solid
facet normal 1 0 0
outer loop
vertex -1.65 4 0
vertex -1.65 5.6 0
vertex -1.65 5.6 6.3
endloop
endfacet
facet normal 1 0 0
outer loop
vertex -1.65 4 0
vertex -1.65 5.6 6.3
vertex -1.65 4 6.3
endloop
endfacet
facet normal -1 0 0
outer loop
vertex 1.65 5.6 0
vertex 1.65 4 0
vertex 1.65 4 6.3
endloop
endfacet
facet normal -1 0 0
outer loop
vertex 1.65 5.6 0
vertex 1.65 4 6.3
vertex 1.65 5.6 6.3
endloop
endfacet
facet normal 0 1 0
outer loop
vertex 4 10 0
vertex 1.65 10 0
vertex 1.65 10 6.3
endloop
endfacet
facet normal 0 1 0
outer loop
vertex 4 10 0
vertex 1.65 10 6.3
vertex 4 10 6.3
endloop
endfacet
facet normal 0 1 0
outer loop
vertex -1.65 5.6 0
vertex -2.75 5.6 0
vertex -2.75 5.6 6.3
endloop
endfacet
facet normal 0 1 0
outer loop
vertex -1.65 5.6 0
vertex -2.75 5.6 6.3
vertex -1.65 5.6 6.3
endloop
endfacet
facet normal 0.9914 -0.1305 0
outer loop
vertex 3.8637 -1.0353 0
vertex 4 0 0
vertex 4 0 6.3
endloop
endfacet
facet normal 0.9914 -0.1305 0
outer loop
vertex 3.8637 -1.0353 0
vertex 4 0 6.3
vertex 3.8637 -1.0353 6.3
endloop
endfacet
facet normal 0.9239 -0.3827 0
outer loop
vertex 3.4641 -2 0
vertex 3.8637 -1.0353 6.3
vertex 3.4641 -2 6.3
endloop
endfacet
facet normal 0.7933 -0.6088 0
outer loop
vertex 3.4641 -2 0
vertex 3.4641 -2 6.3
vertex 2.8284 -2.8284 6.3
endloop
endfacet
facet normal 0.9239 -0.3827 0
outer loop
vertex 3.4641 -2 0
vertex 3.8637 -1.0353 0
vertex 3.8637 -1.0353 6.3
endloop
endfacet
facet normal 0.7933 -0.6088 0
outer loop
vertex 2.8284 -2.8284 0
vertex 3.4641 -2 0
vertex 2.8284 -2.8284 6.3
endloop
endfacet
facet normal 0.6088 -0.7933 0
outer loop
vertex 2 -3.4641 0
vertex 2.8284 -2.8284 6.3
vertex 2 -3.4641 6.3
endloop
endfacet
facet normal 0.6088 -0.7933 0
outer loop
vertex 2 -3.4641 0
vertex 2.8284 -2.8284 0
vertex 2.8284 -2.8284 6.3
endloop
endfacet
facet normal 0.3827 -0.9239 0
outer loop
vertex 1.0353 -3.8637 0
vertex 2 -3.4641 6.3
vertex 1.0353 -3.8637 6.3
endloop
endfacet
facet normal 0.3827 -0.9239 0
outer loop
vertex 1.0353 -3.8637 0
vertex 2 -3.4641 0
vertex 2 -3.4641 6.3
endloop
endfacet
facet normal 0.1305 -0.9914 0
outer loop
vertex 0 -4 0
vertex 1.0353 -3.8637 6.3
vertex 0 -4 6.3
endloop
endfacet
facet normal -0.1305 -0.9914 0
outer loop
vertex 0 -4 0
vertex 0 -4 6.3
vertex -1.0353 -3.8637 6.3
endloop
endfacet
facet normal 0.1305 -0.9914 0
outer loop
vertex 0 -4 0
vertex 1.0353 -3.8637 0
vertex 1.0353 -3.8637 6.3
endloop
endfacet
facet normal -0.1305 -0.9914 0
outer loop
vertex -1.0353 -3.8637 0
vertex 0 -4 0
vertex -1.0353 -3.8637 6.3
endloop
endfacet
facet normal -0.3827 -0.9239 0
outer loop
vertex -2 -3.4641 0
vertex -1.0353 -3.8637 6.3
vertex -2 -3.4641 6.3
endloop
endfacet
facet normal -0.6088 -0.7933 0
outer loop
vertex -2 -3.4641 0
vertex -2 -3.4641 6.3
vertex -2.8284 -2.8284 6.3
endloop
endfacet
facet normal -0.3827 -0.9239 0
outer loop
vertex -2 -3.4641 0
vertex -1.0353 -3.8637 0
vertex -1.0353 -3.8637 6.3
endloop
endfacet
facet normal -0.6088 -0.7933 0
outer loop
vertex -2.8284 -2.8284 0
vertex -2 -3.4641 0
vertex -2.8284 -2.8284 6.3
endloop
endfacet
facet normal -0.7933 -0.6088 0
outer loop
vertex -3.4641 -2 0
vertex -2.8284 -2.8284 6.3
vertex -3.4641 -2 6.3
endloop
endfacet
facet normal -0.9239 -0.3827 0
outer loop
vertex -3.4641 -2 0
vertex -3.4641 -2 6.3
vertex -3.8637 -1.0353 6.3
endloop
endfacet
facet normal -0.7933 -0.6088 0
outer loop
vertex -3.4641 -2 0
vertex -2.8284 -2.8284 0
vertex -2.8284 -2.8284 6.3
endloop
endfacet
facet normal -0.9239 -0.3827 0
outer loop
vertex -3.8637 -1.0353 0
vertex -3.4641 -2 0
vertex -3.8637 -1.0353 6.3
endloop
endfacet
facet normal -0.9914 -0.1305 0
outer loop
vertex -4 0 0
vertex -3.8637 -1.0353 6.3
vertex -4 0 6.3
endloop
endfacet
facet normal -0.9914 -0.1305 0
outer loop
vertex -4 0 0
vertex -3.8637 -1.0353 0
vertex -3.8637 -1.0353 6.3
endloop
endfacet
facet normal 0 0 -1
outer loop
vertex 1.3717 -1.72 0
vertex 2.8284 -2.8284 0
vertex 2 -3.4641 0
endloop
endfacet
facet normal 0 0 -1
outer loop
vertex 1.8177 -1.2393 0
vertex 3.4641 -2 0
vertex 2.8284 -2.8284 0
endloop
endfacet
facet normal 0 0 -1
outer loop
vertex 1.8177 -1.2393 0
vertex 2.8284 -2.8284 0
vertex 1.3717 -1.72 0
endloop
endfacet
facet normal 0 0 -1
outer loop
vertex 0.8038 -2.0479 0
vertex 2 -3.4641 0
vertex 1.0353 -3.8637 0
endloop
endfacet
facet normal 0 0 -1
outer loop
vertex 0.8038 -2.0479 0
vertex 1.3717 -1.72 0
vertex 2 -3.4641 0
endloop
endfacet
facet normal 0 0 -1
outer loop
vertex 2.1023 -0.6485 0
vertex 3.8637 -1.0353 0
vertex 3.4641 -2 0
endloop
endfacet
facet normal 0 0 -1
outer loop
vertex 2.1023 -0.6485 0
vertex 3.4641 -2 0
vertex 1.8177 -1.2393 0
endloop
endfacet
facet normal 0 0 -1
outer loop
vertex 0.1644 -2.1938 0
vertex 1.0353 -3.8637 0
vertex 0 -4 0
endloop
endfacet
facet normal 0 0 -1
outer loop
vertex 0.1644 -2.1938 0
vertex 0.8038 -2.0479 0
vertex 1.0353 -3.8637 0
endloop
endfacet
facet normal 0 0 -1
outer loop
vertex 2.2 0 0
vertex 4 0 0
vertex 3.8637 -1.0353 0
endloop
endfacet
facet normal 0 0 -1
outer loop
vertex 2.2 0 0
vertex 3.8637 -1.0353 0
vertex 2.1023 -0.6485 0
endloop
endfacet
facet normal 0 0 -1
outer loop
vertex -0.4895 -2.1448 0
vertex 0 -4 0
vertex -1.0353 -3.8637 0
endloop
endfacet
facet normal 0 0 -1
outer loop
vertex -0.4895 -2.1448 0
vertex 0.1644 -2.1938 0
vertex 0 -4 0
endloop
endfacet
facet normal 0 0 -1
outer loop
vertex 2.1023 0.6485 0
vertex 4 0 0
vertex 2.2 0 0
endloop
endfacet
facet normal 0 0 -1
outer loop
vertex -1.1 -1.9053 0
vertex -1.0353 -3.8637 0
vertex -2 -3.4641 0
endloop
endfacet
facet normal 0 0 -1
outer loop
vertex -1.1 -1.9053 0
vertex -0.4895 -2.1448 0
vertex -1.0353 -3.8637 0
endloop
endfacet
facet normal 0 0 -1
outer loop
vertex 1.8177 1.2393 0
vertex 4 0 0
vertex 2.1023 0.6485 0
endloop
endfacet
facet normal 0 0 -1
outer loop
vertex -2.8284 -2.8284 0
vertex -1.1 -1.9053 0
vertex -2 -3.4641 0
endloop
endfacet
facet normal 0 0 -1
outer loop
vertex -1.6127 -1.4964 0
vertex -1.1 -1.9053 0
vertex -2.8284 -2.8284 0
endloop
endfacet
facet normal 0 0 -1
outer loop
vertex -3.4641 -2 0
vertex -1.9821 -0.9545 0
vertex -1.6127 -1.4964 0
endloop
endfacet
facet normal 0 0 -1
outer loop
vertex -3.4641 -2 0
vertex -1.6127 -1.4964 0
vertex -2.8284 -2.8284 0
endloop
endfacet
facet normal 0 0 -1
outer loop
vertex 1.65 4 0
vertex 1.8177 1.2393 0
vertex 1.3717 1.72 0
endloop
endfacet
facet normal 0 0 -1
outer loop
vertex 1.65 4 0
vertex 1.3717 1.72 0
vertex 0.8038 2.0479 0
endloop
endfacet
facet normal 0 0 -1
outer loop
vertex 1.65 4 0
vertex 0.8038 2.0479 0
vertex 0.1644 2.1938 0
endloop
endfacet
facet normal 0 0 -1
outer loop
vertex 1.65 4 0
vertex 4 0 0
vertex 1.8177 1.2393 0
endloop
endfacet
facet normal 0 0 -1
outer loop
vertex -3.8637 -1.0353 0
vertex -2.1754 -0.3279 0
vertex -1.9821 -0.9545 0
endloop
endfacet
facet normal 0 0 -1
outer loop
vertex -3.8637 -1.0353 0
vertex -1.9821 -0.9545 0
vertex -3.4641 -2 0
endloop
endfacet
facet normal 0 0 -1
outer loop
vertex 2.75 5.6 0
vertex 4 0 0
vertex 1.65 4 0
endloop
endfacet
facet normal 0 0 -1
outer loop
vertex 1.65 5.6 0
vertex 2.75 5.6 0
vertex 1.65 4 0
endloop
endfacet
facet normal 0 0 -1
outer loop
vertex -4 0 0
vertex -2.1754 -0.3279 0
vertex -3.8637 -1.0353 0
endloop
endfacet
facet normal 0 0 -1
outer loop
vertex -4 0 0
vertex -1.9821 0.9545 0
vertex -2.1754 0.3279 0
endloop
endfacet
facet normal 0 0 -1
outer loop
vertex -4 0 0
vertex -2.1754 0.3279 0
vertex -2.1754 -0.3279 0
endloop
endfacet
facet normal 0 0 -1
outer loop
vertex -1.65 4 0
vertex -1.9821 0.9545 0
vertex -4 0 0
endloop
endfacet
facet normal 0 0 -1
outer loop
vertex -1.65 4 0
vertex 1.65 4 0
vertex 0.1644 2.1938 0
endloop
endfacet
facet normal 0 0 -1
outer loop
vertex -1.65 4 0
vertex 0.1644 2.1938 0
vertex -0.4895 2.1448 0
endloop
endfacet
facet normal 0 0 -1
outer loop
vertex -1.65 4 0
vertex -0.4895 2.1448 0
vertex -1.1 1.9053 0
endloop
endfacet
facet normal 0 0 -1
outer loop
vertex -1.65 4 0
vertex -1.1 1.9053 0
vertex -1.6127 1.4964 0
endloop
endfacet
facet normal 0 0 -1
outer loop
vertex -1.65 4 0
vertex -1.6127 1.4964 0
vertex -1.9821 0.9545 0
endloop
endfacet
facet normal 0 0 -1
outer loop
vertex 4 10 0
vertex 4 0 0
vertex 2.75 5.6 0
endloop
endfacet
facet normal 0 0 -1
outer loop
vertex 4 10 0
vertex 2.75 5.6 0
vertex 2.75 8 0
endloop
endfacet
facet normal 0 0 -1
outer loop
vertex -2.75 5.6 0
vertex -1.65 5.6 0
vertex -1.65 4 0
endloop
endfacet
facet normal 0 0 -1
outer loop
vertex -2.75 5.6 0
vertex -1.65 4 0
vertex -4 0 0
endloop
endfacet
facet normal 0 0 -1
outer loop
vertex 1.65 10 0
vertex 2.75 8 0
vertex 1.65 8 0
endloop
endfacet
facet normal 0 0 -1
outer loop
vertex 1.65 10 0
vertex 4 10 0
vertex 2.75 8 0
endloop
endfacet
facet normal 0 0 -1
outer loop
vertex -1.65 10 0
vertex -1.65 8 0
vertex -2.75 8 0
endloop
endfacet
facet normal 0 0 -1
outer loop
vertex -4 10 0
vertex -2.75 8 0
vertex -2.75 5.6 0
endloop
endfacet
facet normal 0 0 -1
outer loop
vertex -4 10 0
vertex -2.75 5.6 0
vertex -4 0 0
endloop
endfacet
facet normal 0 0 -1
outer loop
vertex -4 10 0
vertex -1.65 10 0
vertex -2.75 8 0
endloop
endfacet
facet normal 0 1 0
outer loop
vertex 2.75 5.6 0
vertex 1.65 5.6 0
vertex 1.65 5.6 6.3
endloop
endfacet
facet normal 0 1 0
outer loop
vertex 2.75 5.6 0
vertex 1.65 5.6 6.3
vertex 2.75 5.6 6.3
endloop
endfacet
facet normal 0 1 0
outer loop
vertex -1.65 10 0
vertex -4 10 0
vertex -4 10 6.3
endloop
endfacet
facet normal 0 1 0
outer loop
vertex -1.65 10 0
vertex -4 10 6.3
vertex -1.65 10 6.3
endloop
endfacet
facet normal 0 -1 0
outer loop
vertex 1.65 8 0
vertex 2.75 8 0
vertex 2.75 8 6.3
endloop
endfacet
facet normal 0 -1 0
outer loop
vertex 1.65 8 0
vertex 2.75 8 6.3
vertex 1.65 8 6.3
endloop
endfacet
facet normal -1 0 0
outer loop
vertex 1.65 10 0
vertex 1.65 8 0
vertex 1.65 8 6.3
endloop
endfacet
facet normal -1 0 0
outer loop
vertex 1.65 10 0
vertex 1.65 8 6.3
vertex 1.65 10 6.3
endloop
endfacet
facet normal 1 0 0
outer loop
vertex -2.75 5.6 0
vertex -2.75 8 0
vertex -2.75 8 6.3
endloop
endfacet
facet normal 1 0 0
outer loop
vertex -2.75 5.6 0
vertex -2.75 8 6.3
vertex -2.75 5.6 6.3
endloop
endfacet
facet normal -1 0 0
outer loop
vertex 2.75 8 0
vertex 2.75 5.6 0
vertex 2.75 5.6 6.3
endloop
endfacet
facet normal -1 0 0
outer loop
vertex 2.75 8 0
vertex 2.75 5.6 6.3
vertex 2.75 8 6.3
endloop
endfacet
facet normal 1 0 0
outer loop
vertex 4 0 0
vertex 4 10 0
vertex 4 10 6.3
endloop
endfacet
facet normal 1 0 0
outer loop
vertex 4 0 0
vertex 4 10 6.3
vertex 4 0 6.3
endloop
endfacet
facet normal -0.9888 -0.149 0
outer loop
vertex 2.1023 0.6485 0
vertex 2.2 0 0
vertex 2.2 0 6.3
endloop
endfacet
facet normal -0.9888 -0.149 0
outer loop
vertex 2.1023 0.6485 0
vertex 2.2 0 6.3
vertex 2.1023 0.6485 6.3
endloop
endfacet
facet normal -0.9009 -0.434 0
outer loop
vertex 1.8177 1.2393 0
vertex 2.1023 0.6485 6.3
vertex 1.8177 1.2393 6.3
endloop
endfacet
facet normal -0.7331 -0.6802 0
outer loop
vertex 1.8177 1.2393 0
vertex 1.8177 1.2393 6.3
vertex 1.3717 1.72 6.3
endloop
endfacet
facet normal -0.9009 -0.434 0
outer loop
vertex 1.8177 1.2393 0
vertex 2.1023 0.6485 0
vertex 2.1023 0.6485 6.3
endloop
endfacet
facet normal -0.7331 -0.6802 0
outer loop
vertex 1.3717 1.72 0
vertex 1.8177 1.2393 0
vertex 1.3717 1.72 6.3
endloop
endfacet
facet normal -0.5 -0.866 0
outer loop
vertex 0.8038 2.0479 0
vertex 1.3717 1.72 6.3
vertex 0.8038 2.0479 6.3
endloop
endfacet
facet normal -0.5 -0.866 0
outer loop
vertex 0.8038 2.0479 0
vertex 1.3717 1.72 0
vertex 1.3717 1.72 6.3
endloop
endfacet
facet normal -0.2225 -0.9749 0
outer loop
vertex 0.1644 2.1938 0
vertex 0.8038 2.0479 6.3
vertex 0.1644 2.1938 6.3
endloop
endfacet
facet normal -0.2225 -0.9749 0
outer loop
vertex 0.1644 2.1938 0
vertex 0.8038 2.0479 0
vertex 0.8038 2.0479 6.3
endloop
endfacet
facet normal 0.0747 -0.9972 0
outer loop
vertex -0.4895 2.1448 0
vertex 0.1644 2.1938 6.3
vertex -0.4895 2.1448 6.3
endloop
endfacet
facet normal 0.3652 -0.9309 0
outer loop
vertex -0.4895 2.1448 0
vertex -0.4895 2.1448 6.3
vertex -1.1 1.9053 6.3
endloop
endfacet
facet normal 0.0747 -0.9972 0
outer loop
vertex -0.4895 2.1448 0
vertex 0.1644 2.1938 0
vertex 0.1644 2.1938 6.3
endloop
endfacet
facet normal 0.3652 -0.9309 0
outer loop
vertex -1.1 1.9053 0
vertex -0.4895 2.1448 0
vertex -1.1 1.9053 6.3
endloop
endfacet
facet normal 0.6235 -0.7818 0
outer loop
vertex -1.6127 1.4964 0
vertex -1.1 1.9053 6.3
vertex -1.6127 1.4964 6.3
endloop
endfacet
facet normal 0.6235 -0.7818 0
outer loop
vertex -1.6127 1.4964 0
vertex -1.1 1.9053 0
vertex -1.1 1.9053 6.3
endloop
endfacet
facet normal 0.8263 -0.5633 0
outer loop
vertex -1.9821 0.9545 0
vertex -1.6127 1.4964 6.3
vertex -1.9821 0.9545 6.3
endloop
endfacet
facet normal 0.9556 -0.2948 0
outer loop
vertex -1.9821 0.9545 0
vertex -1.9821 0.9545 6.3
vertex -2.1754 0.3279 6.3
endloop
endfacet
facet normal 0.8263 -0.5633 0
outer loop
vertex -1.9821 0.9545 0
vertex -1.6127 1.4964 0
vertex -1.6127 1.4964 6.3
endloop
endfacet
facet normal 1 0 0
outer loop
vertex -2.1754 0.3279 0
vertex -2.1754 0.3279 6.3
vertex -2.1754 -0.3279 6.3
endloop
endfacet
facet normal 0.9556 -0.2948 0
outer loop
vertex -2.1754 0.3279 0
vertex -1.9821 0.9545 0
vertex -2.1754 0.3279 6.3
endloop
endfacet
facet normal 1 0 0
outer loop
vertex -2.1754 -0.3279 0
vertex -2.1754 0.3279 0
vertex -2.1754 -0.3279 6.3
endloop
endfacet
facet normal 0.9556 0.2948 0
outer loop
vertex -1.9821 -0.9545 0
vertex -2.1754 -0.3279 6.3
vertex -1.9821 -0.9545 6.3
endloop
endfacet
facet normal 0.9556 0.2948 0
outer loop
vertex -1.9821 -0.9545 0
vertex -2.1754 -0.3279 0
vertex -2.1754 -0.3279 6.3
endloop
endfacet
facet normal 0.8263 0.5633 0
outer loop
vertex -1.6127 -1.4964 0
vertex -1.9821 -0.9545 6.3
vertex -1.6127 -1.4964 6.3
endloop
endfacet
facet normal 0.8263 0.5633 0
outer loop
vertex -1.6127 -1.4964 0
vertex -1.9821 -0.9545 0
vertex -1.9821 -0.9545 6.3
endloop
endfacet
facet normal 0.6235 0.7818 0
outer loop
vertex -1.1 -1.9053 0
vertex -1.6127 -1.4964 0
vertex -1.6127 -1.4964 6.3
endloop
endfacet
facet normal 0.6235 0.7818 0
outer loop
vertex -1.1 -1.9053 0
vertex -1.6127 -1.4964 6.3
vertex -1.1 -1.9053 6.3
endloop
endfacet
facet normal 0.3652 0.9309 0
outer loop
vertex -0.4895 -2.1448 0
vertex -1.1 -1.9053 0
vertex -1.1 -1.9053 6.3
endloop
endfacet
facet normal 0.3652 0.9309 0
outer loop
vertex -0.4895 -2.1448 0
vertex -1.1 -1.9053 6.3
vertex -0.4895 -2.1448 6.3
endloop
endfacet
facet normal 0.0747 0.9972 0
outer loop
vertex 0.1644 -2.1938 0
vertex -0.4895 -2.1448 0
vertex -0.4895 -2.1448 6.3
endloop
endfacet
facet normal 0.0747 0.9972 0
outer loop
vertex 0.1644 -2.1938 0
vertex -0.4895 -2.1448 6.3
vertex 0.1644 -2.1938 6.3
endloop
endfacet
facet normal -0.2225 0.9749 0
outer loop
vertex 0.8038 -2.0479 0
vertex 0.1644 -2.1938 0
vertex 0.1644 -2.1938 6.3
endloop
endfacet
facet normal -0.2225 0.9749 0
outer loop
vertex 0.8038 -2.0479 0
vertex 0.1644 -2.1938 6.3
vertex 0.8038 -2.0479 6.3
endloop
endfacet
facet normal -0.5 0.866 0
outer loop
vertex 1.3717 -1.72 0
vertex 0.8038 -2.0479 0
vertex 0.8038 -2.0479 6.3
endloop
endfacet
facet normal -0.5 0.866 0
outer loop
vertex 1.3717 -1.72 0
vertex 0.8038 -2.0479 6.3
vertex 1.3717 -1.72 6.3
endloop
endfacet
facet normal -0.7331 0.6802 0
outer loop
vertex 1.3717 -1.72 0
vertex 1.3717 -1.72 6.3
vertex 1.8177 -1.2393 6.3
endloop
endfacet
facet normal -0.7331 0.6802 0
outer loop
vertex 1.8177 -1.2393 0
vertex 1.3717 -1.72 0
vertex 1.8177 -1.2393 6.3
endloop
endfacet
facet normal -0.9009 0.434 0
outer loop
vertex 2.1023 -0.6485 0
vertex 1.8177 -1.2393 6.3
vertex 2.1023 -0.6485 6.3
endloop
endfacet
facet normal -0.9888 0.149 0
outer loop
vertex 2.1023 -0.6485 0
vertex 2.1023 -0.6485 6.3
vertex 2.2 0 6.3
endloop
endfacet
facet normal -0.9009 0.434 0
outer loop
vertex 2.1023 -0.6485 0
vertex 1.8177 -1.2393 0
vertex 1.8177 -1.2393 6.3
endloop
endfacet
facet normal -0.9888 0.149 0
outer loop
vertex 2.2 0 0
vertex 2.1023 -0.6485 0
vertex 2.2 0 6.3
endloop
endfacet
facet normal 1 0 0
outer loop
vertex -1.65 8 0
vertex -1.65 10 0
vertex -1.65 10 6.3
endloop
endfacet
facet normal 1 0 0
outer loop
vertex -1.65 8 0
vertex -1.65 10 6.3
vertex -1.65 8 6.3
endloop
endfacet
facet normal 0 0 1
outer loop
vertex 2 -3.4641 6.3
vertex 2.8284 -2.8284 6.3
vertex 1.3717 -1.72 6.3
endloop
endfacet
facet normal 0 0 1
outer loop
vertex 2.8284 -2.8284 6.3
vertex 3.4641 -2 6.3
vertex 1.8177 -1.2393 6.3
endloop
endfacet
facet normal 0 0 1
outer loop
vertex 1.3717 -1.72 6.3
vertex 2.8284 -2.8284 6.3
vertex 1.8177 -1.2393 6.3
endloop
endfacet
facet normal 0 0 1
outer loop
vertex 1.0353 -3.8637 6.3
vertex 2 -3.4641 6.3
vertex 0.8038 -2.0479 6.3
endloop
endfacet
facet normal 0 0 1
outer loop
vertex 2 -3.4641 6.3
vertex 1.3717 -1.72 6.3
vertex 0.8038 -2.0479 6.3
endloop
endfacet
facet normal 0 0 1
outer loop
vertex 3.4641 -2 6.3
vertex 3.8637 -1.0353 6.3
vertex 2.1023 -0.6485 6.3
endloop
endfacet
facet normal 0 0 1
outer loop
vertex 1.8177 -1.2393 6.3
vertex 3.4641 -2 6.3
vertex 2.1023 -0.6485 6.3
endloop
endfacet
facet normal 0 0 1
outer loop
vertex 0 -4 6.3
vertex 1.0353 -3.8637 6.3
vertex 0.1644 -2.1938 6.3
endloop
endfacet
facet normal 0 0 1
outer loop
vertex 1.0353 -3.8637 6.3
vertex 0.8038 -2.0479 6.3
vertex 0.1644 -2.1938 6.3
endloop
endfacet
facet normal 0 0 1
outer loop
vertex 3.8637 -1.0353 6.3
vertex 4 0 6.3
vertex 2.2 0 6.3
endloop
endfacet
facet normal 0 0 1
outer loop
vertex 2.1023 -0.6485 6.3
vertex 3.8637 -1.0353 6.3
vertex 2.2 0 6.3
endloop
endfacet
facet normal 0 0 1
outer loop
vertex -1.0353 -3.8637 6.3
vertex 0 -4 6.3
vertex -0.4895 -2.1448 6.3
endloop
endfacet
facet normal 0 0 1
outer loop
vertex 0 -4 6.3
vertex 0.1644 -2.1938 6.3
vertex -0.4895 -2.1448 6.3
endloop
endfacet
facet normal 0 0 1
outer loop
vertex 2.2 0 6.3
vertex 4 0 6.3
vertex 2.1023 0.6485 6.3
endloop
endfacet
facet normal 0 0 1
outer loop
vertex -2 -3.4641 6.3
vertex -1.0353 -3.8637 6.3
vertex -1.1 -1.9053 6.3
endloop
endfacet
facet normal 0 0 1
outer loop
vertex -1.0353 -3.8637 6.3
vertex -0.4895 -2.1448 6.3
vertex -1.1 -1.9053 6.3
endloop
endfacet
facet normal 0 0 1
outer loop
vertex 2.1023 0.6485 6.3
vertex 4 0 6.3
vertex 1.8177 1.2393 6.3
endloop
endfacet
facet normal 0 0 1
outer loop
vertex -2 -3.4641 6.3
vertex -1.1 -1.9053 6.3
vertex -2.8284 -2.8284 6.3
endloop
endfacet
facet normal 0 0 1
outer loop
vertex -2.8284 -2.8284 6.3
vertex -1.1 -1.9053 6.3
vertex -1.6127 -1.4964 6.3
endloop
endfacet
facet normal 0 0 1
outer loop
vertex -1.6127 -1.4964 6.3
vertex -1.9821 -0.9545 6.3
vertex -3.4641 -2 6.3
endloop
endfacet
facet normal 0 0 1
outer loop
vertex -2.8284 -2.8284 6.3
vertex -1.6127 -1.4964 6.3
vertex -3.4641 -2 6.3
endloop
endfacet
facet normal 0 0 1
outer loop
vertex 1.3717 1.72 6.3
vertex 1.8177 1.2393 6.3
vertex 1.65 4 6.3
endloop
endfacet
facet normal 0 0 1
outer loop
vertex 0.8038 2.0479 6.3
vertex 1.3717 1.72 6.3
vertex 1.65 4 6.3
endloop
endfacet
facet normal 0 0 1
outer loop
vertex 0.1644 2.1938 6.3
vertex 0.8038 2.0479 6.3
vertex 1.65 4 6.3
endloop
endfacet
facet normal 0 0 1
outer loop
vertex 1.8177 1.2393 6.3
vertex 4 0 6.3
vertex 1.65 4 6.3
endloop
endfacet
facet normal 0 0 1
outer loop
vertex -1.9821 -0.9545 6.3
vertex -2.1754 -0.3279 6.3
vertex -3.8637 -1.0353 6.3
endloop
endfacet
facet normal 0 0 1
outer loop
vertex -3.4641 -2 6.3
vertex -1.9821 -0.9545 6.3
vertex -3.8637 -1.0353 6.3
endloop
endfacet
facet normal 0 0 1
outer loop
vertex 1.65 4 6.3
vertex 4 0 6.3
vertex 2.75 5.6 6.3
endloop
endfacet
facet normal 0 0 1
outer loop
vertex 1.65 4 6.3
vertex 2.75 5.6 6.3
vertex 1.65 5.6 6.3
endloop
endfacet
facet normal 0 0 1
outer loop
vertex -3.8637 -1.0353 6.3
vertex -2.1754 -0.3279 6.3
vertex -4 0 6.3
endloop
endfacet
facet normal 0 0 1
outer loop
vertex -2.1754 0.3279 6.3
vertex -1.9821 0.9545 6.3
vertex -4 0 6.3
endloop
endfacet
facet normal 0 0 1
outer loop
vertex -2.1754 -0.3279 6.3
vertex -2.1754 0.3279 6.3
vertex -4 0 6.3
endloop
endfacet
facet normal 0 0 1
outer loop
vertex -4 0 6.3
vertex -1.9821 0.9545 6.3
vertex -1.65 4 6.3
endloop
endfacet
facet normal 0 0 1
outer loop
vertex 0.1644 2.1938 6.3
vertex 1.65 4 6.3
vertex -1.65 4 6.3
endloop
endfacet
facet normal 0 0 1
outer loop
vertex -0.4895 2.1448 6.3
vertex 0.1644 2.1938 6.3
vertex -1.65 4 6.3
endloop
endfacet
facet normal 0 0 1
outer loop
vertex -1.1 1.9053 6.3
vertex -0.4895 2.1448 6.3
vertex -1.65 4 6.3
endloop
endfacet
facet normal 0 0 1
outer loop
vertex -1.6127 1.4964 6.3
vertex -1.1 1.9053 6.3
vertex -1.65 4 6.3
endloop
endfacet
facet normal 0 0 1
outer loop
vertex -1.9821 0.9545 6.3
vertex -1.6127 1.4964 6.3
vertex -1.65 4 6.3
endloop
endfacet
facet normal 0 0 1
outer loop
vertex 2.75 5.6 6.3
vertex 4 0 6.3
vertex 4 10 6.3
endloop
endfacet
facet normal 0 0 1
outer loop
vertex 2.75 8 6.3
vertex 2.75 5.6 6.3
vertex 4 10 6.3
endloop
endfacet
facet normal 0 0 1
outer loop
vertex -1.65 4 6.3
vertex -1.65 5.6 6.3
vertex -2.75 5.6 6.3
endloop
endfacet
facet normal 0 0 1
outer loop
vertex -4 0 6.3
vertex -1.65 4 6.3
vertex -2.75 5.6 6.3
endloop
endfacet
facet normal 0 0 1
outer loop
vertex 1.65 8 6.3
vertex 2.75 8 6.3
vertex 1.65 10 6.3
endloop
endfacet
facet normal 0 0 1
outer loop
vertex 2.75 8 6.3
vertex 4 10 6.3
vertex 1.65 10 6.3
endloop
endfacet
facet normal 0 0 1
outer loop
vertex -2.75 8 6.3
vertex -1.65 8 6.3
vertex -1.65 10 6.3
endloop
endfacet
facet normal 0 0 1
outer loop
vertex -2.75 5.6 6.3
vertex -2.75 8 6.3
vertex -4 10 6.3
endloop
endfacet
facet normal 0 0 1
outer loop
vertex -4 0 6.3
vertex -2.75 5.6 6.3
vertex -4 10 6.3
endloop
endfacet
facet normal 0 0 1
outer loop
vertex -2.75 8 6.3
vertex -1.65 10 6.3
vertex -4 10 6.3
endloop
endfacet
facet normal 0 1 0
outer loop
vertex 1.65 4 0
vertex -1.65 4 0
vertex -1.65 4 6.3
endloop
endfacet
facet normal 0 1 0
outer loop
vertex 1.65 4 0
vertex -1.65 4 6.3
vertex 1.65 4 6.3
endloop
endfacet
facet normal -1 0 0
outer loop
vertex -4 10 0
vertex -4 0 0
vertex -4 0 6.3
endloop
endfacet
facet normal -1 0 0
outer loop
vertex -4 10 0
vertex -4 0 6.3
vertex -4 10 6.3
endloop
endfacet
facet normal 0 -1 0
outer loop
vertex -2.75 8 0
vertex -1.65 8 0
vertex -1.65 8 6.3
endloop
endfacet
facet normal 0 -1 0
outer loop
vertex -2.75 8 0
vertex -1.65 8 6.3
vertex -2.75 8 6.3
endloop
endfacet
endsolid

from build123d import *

# Parameters (mm, degrees)
SKETCH1_R           = 2.2
BOSS_EXTRUDE1_DEPTH = 6.3


with BuildPart() as part:
    # Sketch1 → Boss-Extrude1 (new body)
    with BuildSketch(Plane.XY):
        with BuildLine():
            Line((-4, 0), (-4, 10))
            Line((-4, 10), (-1.65, 10))
            Line((-1.65, 10), (-1.65, 8))
            Line((-1.65, 8), (-2.75, 8))
            Line((-2.75, 8), (-2.75, 5.6))
            Line((-2.75, 5.6), (-1.65, 5.6))
            Line((-1.65, 5.6), (-1.65, 4))
            Line((-1.65, 4), (1.65, 4))
            Line((1.65, 4), (1.65, 5.6))
            Line((1.65, 5.6), (2.75, 5.6))
            Line((2.75, 5.6), (2.75, 8))
            Line((2.75, 8), (1.65, 8))
            Line((1.65, 8), (1.65, 10))
            Line((1.65, 10), (4, 10))
            Line((4, 10), (4, 0))
            ThreePointArc((4, 0), (0, -4), (-4, 0))
        make_face()
        Circle(SKETCH1_R, mode=Mode.SUBTRACT)
    extrude(amount=BOSS_EXTRUDE1_DEPTH)


solid = part.part
